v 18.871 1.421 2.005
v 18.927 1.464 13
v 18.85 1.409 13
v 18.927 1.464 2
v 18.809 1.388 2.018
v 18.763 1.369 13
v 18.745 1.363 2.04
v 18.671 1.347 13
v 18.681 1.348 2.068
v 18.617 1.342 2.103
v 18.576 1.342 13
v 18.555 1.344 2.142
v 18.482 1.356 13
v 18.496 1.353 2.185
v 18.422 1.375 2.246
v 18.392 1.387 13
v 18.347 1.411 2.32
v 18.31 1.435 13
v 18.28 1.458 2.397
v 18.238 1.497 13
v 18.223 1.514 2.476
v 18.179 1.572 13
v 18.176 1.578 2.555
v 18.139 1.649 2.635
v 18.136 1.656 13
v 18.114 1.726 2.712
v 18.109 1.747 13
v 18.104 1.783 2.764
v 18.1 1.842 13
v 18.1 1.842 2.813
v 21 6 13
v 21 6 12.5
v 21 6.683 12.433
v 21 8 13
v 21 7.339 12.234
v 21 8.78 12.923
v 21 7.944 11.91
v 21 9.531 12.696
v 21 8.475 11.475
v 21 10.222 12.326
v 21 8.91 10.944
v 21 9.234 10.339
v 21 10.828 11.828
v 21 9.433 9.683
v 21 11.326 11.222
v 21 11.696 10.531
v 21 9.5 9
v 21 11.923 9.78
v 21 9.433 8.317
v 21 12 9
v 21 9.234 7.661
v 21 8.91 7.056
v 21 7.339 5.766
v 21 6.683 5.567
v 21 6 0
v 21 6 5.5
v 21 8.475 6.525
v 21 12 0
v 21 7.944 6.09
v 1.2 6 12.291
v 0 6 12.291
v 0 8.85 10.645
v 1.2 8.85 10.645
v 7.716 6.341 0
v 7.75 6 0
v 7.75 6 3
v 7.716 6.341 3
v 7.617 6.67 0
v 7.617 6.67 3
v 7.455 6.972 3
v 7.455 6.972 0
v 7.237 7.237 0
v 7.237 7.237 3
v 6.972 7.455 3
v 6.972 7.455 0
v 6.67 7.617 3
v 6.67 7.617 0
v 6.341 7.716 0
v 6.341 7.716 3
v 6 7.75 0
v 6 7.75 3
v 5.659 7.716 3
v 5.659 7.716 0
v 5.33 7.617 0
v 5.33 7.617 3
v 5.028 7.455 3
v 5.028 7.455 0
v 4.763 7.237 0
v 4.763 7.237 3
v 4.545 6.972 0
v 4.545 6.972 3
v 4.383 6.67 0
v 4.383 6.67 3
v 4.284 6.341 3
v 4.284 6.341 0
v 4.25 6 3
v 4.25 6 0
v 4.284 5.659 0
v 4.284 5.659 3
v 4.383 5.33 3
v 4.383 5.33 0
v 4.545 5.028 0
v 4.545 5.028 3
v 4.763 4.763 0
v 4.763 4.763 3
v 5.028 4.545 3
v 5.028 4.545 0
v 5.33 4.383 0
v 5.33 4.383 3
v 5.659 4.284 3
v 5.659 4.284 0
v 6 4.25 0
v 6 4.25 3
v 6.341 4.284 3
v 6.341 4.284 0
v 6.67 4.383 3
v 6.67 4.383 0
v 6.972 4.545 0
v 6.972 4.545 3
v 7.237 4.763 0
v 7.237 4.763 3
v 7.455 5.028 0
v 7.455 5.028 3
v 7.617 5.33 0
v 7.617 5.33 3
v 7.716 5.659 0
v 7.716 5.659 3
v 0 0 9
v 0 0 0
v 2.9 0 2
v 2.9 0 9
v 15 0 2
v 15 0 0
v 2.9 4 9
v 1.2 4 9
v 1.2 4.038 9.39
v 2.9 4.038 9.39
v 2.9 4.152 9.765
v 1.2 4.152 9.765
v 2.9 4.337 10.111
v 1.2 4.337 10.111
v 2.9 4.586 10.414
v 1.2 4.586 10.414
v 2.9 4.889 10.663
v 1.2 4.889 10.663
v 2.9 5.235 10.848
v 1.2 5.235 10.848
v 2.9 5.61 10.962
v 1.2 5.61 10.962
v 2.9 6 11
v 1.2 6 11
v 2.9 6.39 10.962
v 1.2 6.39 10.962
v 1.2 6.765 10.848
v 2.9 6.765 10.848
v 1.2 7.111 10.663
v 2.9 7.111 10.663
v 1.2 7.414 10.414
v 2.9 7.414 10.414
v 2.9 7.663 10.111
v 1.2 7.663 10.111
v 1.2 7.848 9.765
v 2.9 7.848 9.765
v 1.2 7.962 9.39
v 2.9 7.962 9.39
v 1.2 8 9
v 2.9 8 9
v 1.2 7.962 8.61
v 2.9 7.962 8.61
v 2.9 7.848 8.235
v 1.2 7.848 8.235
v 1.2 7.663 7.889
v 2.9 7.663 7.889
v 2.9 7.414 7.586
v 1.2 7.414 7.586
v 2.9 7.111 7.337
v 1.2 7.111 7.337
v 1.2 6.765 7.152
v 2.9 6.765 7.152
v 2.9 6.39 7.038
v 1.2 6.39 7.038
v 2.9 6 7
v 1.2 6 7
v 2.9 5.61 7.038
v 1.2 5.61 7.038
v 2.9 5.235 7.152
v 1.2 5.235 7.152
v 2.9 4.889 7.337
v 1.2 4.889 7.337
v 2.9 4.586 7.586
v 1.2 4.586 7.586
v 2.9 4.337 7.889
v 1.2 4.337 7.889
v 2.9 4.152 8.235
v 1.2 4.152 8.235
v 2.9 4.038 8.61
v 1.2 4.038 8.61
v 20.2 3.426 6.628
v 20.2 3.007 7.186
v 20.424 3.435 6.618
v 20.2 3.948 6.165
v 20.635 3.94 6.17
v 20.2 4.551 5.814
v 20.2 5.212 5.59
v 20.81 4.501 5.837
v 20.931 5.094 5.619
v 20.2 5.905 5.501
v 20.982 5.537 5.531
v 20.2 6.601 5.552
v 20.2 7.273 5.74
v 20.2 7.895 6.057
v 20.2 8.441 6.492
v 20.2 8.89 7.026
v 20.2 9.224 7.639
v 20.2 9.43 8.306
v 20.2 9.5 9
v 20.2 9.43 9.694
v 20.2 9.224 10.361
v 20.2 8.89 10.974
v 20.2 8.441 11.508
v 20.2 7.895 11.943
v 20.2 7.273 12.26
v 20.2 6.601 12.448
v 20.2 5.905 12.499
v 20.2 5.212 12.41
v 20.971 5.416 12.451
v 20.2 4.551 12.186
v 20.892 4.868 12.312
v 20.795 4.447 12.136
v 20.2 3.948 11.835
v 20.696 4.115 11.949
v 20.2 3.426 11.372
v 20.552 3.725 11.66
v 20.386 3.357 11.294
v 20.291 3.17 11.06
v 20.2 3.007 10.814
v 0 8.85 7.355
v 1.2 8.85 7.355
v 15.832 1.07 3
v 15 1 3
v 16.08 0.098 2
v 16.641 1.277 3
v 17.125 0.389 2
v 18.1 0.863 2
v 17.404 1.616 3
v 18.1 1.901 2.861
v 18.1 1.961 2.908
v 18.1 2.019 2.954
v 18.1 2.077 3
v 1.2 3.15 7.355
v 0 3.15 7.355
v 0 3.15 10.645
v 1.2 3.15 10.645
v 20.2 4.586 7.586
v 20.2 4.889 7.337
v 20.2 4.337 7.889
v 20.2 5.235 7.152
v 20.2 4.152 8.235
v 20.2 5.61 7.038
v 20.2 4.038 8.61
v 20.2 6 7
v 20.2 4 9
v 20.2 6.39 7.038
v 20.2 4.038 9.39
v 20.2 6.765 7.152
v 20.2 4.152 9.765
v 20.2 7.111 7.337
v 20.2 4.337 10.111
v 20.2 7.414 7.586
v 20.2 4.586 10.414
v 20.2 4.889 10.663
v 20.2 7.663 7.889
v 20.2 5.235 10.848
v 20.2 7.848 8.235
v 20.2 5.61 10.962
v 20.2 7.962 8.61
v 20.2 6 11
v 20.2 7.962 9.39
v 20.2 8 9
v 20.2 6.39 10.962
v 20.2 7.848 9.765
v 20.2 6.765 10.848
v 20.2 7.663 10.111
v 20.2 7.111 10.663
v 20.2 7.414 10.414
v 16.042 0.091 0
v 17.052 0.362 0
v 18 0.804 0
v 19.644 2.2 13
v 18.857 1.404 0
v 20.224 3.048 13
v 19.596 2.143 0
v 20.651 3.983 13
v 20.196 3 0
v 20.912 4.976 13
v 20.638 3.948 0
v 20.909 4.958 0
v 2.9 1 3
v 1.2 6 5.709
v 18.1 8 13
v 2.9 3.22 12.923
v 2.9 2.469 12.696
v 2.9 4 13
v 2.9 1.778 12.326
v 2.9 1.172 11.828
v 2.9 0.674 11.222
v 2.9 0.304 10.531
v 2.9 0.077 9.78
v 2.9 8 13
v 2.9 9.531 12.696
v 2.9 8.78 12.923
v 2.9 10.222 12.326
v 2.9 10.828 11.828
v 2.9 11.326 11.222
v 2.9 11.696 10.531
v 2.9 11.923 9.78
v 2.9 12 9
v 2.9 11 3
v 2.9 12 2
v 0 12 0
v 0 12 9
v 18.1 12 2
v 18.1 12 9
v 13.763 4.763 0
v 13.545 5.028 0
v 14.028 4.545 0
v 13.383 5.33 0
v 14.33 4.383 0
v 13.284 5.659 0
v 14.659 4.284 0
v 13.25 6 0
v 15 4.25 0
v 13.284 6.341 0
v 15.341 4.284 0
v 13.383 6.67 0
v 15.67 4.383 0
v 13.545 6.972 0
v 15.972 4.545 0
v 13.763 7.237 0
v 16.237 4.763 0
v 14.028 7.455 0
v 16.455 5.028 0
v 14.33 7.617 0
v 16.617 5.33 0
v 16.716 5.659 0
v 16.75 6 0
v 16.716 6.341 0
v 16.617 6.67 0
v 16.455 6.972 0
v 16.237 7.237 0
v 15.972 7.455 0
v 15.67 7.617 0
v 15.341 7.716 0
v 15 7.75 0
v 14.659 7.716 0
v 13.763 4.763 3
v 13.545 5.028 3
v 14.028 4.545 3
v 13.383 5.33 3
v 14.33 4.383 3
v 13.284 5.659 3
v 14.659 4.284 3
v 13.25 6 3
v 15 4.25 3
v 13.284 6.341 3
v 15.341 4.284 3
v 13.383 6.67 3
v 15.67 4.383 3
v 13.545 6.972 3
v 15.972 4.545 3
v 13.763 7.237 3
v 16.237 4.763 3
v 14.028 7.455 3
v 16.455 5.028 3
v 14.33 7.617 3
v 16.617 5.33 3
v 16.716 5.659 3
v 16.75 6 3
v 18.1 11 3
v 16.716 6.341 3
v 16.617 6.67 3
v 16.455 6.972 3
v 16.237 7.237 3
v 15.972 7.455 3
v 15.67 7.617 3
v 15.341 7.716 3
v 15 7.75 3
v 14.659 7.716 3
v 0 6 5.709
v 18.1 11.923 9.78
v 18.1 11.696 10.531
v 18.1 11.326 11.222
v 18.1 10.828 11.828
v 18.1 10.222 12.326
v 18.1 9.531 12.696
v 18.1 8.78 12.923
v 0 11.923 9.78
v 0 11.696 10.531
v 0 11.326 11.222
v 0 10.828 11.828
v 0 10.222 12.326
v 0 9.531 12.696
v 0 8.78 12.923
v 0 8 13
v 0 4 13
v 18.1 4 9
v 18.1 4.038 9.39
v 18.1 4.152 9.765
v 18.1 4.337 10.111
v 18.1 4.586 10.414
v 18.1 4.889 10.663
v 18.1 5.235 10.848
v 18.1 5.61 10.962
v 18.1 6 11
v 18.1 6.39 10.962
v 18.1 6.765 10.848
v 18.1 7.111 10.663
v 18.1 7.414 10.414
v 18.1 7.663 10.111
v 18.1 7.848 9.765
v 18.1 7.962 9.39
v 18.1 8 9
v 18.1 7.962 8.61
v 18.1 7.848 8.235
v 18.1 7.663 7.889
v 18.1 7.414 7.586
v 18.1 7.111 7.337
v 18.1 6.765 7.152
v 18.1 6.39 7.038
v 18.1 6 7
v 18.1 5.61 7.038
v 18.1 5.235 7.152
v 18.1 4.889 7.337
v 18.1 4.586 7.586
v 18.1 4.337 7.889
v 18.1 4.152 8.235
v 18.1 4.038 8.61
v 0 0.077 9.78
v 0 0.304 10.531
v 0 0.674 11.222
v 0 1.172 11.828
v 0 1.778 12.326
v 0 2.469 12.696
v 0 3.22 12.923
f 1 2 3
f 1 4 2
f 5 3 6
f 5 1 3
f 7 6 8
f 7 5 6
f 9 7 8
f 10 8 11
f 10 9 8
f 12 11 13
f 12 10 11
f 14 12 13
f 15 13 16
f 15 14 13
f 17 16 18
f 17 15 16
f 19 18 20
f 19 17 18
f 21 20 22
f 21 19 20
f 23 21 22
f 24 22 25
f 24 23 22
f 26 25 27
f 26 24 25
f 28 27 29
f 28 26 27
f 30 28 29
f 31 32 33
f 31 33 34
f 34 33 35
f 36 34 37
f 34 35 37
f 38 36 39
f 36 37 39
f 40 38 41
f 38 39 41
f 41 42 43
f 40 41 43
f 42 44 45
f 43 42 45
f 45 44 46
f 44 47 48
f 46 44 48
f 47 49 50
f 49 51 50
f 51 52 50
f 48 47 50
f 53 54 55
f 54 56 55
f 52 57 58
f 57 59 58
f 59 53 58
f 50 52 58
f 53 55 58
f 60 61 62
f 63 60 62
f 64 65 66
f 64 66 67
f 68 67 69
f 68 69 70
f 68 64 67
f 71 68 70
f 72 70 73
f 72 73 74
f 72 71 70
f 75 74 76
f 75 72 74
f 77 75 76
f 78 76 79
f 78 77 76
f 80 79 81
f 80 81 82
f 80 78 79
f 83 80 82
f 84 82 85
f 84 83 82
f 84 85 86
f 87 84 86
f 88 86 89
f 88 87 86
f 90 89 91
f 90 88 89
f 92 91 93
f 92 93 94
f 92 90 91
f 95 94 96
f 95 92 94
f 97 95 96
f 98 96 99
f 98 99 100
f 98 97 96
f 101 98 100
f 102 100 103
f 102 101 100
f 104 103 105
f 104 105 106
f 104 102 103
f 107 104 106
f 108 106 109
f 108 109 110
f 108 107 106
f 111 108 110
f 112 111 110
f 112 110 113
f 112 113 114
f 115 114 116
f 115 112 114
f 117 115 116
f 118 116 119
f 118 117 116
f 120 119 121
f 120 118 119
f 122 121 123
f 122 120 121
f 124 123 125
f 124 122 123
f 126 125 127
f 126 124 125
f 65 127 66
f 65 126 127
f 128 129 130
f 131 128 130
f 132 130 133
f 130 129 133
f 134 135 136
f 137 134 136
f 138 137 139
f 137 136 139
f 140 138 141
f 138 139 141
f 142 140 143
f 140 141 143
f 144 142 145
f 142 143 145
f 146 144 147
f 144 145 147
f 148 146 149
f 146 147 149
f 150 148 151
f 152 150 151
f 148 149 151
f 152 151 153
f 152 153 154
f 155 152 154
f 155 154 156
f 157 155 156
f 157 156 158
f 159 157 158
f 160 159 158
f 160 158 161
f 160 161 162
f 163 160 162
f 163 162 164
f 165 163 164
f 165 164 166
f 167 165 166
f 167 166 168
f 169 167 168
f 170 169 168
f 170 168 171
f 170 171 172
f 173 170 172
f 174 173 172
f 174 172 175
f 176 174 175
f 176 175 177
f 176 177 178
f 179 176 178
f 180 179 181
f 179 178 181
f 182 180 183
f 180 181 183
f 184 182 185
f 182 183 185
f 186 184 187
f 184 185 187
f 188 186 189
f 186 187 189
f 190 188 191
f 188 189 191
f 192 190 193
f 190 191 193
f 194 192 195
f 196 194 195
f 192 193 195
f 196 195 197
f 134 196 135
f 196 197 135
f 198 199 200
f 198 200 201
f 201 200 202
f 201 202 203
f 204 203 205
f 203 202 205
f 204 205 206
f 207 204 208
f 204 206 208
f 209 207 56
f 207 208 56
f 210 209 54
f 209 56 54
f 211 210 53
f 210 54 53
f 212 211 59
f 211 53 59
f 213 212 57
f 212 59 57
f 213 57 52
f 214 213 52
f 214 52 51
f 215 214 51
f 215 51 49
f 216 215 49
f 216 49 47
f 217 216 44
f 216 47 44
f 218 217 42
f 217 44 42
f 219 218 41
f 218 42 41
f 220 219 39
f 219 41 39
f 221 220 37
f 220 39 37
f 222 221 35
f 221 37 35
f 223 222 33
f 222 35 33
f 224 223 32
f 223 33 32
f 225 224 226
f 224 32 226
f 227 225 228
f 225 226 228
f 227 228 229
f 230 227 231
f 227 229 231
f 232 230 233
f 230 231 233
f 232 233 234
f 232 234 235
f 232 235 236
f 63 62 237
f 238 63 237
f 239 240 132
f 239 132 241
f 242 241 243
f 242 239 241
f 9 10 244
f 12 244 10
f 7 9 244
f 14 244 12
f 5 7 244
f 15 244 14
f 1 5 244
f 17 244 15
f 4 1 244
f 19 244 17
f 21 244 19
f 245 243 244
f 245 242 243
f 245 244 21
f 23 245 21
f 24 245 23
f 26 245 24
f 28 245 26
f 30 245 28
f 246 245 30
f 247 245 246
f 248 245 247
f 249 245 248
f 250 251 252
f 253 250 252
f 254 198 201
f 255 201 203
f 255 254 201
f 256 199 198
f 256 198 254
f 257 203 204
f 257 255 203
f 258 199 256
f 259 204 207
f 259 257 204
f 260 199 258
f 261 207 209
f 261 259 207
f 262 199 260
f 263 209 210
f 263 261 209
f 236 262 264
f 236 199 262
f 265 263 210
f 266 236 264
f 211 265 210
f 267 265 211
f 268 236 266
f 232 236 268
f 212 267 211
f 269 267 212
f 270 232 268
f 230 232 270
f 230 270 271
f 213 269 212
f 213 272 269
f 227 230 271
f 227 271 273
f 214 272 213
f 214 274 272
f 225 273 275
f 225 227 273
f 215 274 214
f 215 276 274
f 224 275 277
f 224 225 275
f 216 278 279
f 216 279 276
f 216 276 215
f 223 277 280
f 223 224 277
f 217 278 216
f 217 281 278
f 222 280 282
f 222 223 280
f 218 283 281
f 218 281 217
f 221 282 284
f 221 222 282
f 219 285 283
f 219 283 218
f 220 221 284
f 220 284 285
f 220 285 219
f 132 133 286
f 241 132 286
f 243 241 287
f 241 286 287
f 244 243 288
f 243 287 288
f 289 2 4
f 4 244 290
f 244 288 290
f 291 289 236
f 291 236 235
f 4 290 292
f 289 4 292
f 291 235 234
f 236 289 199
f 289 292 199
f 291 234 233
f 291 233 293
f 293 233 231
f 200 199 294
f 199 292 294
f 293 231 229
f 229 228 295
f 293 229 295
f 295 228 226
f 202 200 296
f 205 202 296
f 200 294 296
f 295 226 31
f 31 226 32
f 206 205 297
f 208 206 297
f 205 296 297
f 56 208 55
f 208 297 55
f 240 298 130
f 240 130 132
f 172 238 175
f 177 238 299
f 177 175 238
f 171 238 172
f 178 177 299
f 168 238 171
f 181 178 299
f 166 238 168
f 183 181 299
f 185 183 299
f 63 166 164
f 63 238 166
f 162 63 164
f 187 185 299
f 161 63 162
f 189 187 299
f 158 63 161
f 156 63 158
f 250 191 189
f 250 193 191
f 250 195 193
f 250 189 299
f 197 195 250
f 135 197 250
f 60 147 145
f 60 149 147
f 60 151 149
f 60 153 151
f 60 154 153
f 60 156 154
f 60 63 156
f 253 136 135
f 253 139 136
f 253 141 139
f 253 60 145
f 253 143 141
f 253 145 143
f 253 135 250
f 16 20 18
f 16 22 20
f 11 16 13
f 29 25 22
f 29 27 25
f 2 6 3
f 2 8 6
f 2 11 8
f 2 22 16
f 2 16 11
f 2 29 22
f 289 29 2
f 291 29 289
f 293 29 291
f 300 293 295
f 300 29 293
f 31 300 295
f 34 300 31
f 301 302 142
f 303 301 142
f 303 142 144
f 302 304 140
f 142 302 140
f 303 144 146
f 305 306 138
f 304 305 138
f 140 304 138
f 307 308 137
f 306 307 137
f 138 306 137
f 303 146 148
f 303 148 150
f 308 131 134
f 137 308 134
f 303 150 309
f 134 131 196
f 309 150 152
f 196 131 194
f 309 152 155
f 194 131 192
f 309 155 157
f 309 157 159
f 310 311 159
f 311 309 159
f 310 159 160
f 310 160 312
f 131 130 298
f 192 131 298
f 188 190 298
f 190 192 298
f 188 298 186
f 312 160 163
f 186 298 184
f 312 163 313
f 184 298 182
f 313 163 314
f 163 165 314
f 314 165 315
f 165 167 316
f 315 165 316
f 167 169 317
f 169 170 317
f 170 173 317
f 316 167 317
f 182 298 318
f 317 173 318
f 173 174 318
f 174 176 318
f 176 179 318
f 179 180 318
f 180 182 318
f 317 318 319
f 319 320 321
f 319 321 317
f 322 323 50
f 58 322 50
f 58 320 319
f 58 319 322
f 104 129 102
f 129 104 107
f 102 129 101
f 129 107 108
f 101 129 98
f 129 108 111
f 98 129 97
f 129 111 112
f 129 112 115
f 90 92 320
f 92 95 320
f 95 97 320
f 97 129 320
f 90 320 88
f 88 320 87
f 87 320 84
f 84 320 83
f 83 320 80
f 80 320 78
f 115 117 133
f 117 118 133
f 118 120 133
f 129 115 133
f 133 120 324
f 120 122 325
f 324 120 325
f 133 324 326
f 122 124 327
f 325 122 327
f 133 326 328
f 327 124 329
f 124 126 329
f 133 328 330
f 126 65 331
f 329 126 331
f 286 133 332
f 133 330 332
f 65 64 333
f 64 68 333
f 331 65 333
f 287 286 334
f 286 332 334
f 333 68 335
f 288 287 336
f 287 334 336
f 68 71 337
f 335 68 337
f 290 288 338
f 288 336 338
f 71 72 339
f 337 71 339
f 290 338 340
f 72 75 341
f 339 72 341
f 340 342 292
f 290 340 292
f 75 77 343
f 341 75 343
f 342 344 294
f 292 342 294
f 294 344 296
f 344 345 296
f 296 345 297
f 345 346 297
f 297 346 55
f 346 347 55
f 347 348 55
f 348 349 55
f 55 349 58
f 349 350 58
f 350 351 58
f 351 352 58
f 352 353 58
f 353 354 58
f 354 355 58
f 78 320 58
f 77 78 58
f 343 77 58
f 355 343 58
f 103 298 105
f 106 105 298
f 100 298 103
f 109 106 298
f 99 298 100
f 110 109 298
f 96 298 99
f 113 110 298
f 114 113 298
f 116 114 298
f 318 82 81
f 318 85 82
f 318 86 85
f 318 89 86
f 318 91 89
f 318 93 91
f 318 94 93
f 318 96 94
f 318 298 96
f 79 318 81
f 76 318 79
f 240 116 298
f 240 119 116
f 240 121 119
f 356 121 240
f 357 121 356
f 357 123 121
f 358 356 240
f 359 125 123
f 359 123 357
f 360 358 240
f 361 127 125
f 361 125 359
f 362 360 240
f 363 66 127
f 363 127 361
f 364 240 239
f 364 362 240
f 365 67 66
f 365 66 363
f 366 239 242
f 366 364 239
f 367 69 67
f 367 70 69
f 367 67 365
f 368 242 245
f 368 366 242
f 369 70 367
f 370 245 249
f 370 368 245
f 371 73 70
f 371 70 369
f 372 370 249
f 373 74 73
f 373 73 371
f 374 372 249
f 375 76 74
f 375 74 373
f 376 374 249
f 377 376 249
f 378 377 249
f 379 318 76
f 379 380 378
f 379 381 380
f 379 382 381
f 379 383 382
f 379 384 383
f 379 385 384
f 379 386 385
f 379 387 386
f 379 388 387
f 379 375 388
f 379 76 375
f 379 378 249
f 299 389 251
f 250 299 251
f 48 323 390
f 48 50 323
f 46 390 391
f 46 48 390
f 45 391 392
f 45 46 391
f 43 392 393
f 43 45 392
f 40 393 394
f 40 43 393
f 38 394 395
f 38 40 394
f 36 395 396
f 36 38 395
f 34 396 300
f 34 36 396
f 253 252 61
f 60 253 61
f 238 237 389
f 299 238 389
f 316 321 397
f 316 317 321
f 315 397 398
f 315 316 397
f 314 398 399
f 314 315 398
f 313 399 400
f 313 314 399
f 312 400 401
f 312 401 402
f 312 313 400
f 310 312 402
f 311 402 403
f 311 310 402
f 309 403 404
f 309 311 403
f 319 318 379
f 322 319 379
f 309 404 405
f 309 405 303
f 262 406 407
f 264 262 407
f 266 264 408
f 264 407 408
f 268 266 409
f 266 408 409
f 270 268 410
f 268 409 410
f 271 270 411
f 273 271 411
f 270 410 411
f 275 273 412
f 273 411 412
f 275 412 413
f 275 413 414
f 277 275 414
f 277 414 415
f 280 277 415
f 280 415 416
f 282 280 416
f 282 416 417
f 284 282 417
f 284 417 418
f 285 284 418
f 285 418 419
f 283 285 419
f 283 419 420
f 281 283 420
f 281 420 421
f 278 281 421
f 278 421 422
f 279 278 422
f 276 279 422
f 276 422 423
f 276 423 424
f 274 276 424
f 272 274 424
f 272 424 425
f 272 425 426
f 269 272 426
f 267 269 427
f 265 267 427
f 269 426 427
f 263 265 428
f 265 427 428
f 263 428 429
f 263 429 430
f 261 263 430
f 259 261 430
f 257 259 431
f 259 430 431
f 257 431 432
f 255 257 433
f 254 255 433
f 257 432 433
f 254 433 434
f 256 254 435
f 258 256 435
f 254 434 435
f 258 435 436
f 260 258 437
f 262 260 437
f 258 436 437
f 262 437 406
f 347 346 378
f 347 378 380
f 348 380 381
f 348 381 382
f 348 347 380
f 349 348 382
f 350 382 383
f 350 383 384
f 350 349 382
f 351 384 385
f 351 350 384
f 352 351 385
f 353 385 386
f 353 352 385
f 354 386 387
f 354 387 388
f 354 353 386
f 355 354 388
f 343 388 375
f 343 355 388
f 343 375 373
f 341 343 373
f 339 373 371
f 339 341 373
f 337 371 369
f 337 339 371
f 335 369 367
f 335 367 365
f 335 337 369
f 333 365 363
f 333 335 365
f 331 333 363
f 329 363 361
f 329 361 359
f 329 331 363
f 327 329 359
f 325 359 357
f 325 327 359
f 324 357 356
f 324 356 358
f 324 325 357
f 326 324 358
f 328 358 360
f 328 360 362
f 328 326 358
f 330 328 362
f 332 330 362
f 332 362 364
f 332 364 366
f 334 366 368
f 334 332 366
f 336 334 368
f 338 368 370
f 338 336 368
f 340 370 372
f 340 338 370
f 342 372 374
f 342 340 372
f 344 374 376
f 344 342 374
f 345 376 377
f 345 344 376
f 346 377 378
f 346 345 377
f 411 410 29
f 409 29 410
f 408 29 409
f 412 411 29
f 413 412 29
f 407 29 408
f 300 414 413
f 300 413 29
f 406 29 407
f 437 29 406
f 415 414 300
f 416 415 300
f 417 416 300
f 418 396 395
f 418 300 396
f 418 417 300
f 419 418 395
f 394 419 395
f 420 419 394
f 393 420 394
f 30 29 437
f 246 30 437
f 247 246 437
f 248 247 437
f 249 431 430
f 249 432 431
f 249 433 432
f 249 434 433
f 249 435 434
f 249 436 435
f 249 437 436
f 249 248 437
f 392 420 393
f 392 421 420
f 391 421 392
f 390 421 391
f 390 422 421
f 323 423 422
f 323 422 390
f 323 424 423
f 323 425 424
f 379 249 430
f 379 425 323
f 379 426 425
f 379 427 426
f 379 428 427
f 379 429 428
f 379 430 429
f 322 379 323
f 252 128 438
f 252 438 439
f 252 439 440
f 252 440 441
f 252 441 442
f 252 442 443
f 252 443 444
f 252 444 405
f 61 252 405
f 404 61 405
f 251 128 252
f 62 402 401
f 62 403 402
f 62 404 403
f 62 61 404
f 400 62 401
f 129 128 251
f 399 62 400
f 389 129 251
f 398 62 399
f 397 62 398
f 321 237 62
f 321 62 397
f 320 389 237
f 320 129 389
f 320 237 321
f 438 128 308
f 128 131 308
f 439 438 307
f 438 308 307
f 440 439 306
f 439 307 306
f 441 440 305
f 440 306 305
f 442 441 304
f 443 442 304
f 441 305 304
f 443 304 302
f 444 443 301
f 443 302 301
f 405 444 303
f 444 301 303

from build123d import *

# Parameters (mm, degrees)
F0_W        = 21
F0_H        = 12
F0_R        = 1.75
F1_DEPTH    = 3
F2_W        = 2.9
F2_H        = 12
F3_DEPTH    = 10
F4_R        = 2
F5_DEPTH    = 21.001
F6_T1_DEPTH = 43
F7_SIZE     = 1
F8_R        = 4
F9_R        = 0.5
F10_R       = 3.5
F11_DEPTH   = 0.8
F13_DEPTH   = 1.2


# Not quite as in the source:
# - a fillet or chamfer that OpenCascade refuses, or shapes differently, is made with other operations: its cross-section is extruded or revolved along the edge and cut away or added


with BuildPart() as f1:
    # F0 (on Top) → F1 (new body)
    with BuildSketch(Plane.XY):
        with Locations((10.5, 6)):
            Rectangle(F0_W, F0_H)
        with Locations((6, 6)):
            Circle(F0_R, mode=Mode.SUBTRACT)
        with Locations((15, 6)):
            Circle(F0_R, mode=Mode.SUBTRACT)
    extrude(amount=F1_DEPTH)

    # F2 (on face) → F3 (join)
    with BuildSketch(Plane.XY.offset(3)):
        with Locations((1.45, 6)):
            Rectangle(F2_W, F2_H)
        with Locations((19.55, 6)):
            Rectangle(F2_W, F2_H)
    extrude(amount=F3_DEPTH)

    # F4 (on face) → F5 (cut, through all)
    with BuildSketch(Plane(origin=(0, 0, 0), x_dir=(0, -1, 0), z_dir=(-1, 0, 0))):
        with Locations((-6, 9)):
            Circle(F4_R)
    extrude(amount=-F5_DEPTH, mode=Mode.SUBTRACT)

    # F6: fillet of radius 6 on 1 edges, made by hand

    # F6_s2 → F6_t1 (cut)
    with BuildSketch(Plane.XY.offset(-15)):
        with BuildLine():
            ThreePointArc((15, 0), (19.2426406871, 1.7573593129), (21, 6))
            Line((21, 6), (21, 0))
            Line((21, 0), (15, 0))
        make_face()
    extrude(amount=F6_T1_DEPTH, mode=Mode.SUBTRACT)

    # F7
    f7_edges = [f1.edges().sort_by_distance(p)[0] for p in [
        (8.95, 0, 3),
        (10.5, 12, 3),
    ]]
    chamfer(f7_edges, length=F7_SIZE)

    # F8
    f8_edges = [f1.edges().sort_by_distance(p)[0] for p in [
        (19.55, 12, 13),
        (1.45, 0, 13),
        (1.45, 12, 13),
    ]]
    fillet(f8_edges, radius=F8_R)

    # F9
    f9_edges = [f1.edges().sort_by_distance(p)[0] for p in [
        (18.1, 0.86288, 8),
    ]]
    fillet(f9_edges, radius=F9_R)

    # F10 (on face) → F11 (cut)
    with BuildSketch(Plane.YZ.offset(21)):
        with Locations((6, 9)):
            Circle(F10_R)
    extrude(amount=-F11_DEPTH, mode=Mode.SUBTRACT)

    # F12 (on face) → F13 (cut)
    with BuildSketch(Plane(origin=(0, 0, 0), x_dir=(0, -1, 0), z_dir=(-1, 0, 0))):
        Polygon((-3.15, 7.3545517328), (-3.15, 10.6454482672), (-6, 12.2908965344), (-8.85, 10.6454482672), (-8.85, 7.3545517328), (-6, 5.7091034656), align=None)
    extrude(amount=-F13_DEPTH, mode=Mode.SUBTRACT)


solid = f1.part
